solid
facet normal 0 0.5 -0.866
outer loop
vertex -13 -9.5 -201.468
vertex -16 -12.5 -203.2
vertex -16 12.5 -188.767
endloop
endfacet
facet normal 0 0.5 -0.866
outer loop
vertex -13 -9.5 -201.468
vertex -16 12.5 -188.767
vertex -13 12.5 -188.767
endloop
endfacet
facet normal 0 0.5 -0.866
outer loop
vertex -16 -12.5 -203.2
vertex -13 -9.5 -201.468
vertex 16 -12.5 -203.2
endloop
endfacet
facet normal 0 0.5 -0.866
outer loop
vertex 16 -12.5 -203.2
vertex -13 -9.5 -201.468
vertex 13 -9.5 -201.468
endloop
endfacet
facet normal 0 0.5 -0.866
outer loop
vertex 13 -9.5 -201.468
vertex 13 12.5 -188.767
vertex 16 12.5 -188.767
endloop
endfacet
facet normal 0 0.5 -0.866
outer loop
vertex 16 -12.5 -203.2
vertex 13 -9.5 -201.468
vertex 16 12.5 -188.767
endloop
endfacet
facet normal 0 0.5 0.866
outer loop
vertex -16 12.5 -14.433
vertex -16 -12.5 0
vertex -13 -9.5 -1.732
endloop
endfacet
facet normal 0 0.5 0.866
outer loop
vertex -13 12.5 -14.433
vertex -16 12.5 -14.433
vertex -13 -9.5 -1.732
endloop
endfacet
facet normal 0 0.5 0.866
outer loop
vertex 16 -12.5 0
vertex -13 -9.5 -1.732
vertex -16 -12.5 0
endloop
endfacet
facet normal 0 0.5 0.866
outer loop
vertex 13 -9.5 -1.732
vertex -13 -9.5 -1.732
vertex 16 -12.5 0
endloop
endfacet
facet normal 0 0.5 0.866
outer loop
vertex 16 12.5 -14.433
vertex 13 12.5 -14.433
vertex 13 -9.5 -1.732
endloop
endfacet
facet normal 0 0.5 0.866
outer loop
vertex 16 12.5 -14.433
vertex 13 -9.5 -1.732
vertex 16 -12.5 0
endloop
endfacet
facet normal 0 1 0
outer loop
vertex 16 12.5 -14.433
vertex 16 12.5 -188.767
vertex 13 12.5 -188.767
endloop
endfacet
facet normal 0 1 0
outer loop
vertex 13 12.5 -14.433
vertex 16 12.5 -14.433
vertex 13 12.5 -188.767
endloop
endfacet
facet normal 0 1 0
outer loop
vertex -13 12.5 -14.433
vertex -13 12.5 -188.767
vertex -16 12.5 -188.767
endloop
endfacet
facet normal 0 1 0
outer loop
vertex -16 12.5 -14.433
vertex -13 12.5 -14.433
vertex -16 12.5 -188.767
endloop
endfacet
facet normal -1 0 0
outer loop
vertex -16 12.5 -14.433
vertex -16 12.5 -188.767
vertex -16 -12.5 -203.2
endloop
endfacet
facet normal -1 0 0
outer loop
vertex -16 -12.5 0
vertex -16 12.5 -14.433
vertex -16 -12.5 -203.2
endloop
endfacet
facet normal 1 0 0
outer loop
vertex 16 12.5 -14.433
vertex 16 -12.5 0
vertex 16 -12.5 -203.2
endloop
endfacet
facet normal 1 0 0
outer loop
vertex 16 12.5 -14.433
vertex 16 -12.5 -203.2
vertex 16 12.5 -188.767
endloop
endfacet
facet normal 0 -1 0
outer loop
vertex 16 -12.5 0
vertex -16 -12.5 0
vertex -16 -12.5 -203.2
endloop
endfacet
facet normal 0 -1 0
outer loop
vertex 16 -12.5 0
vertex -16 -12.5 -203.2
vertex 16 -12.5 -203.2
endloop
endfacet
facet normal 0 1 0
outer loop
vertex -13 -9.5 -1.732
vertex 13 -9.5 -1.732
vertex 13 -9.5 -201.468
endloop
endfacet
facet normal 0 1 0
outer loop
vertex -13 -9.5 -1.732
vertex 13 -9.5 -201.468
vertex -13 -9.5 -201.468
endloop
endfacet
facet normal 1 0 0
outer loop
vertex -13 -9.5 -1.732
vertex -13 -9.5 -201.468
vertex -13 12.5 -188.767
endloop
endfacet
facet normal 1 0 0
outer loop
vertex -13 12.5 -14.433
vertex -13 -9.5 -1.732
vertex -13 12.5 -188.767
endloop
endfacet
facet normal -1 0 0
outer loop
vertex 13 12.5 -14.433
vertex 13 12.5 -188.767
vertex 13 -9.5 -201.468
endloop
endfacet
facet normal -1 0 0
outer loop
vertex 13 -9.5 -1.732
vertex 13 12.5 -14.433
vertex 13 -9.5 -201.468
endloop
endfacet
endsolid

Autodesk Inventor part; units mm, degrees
ref_plane "YZ Plane" through (0, 0, 0) normal (1, 0, 0) x (0, 1, 0)
ref_plane "XZ Plane" through (0, 0, 0) normal (0, 1, 0) x (-1, 0, 0)
ref_plane "XY Plane" through (0, 0, 0) normal (0, 0, 1) x (1, 0, 0)
sketch "Sketch1" plane through (0, 0, 0) normal (0, 0, 1) x (1, 0, 0)
  line L0 (-16, -12.5) -> (16, -12.5)
  line L1 (16, -12.5) -> (16, 12.5)
  line L2 (16, 12.5) -> (13, 12.5)
  line L3 (13, 12.5) -> (13, -9.5)
  line L4 (13, -9.5) -> (-13, -9.5)
  line L5 (-13, -9.5) -> (-13, 12.5)
  line L6 (-13, 12.5) -> (-16, 12.5)
  line L7 (-16, 12.5) -> (-16, -12.5)
  point P0 (0, 0)
  dimension "d0" = 32
  dimension "d1" = 25
  dimension "d2" = 3
  dimension "d3" = 90
  dimension "d4" = 22
  dimension "d5" = 26
  dimension "d6" = 22
  dimension "d7" = 3
  dimension "d8" = 25
  dimension "d10" = 12.5
  dimension "d11" = 16
extrude "Extrusion1" add sketch "Sketch1" against normal blind 203.2
chamfer "Chamfer1" distance 25 angle 30 1 edges at (14.5, 12.5, 0) measured on face at (4.3333, -11.5, 0)
chamfer "Chamfer2" distance 25 angle 30 1 edges at (14.5, 12.5, -203.2) measured on face at (4.3333, -11.5, -203.2)
equation "\"d5\" = d0 - 2 * d7"
equation "\"d10\" = 0.5 * d1"
equation "\"d11\" = 0.5 * d0"
properties part number "Chassis Corner"
